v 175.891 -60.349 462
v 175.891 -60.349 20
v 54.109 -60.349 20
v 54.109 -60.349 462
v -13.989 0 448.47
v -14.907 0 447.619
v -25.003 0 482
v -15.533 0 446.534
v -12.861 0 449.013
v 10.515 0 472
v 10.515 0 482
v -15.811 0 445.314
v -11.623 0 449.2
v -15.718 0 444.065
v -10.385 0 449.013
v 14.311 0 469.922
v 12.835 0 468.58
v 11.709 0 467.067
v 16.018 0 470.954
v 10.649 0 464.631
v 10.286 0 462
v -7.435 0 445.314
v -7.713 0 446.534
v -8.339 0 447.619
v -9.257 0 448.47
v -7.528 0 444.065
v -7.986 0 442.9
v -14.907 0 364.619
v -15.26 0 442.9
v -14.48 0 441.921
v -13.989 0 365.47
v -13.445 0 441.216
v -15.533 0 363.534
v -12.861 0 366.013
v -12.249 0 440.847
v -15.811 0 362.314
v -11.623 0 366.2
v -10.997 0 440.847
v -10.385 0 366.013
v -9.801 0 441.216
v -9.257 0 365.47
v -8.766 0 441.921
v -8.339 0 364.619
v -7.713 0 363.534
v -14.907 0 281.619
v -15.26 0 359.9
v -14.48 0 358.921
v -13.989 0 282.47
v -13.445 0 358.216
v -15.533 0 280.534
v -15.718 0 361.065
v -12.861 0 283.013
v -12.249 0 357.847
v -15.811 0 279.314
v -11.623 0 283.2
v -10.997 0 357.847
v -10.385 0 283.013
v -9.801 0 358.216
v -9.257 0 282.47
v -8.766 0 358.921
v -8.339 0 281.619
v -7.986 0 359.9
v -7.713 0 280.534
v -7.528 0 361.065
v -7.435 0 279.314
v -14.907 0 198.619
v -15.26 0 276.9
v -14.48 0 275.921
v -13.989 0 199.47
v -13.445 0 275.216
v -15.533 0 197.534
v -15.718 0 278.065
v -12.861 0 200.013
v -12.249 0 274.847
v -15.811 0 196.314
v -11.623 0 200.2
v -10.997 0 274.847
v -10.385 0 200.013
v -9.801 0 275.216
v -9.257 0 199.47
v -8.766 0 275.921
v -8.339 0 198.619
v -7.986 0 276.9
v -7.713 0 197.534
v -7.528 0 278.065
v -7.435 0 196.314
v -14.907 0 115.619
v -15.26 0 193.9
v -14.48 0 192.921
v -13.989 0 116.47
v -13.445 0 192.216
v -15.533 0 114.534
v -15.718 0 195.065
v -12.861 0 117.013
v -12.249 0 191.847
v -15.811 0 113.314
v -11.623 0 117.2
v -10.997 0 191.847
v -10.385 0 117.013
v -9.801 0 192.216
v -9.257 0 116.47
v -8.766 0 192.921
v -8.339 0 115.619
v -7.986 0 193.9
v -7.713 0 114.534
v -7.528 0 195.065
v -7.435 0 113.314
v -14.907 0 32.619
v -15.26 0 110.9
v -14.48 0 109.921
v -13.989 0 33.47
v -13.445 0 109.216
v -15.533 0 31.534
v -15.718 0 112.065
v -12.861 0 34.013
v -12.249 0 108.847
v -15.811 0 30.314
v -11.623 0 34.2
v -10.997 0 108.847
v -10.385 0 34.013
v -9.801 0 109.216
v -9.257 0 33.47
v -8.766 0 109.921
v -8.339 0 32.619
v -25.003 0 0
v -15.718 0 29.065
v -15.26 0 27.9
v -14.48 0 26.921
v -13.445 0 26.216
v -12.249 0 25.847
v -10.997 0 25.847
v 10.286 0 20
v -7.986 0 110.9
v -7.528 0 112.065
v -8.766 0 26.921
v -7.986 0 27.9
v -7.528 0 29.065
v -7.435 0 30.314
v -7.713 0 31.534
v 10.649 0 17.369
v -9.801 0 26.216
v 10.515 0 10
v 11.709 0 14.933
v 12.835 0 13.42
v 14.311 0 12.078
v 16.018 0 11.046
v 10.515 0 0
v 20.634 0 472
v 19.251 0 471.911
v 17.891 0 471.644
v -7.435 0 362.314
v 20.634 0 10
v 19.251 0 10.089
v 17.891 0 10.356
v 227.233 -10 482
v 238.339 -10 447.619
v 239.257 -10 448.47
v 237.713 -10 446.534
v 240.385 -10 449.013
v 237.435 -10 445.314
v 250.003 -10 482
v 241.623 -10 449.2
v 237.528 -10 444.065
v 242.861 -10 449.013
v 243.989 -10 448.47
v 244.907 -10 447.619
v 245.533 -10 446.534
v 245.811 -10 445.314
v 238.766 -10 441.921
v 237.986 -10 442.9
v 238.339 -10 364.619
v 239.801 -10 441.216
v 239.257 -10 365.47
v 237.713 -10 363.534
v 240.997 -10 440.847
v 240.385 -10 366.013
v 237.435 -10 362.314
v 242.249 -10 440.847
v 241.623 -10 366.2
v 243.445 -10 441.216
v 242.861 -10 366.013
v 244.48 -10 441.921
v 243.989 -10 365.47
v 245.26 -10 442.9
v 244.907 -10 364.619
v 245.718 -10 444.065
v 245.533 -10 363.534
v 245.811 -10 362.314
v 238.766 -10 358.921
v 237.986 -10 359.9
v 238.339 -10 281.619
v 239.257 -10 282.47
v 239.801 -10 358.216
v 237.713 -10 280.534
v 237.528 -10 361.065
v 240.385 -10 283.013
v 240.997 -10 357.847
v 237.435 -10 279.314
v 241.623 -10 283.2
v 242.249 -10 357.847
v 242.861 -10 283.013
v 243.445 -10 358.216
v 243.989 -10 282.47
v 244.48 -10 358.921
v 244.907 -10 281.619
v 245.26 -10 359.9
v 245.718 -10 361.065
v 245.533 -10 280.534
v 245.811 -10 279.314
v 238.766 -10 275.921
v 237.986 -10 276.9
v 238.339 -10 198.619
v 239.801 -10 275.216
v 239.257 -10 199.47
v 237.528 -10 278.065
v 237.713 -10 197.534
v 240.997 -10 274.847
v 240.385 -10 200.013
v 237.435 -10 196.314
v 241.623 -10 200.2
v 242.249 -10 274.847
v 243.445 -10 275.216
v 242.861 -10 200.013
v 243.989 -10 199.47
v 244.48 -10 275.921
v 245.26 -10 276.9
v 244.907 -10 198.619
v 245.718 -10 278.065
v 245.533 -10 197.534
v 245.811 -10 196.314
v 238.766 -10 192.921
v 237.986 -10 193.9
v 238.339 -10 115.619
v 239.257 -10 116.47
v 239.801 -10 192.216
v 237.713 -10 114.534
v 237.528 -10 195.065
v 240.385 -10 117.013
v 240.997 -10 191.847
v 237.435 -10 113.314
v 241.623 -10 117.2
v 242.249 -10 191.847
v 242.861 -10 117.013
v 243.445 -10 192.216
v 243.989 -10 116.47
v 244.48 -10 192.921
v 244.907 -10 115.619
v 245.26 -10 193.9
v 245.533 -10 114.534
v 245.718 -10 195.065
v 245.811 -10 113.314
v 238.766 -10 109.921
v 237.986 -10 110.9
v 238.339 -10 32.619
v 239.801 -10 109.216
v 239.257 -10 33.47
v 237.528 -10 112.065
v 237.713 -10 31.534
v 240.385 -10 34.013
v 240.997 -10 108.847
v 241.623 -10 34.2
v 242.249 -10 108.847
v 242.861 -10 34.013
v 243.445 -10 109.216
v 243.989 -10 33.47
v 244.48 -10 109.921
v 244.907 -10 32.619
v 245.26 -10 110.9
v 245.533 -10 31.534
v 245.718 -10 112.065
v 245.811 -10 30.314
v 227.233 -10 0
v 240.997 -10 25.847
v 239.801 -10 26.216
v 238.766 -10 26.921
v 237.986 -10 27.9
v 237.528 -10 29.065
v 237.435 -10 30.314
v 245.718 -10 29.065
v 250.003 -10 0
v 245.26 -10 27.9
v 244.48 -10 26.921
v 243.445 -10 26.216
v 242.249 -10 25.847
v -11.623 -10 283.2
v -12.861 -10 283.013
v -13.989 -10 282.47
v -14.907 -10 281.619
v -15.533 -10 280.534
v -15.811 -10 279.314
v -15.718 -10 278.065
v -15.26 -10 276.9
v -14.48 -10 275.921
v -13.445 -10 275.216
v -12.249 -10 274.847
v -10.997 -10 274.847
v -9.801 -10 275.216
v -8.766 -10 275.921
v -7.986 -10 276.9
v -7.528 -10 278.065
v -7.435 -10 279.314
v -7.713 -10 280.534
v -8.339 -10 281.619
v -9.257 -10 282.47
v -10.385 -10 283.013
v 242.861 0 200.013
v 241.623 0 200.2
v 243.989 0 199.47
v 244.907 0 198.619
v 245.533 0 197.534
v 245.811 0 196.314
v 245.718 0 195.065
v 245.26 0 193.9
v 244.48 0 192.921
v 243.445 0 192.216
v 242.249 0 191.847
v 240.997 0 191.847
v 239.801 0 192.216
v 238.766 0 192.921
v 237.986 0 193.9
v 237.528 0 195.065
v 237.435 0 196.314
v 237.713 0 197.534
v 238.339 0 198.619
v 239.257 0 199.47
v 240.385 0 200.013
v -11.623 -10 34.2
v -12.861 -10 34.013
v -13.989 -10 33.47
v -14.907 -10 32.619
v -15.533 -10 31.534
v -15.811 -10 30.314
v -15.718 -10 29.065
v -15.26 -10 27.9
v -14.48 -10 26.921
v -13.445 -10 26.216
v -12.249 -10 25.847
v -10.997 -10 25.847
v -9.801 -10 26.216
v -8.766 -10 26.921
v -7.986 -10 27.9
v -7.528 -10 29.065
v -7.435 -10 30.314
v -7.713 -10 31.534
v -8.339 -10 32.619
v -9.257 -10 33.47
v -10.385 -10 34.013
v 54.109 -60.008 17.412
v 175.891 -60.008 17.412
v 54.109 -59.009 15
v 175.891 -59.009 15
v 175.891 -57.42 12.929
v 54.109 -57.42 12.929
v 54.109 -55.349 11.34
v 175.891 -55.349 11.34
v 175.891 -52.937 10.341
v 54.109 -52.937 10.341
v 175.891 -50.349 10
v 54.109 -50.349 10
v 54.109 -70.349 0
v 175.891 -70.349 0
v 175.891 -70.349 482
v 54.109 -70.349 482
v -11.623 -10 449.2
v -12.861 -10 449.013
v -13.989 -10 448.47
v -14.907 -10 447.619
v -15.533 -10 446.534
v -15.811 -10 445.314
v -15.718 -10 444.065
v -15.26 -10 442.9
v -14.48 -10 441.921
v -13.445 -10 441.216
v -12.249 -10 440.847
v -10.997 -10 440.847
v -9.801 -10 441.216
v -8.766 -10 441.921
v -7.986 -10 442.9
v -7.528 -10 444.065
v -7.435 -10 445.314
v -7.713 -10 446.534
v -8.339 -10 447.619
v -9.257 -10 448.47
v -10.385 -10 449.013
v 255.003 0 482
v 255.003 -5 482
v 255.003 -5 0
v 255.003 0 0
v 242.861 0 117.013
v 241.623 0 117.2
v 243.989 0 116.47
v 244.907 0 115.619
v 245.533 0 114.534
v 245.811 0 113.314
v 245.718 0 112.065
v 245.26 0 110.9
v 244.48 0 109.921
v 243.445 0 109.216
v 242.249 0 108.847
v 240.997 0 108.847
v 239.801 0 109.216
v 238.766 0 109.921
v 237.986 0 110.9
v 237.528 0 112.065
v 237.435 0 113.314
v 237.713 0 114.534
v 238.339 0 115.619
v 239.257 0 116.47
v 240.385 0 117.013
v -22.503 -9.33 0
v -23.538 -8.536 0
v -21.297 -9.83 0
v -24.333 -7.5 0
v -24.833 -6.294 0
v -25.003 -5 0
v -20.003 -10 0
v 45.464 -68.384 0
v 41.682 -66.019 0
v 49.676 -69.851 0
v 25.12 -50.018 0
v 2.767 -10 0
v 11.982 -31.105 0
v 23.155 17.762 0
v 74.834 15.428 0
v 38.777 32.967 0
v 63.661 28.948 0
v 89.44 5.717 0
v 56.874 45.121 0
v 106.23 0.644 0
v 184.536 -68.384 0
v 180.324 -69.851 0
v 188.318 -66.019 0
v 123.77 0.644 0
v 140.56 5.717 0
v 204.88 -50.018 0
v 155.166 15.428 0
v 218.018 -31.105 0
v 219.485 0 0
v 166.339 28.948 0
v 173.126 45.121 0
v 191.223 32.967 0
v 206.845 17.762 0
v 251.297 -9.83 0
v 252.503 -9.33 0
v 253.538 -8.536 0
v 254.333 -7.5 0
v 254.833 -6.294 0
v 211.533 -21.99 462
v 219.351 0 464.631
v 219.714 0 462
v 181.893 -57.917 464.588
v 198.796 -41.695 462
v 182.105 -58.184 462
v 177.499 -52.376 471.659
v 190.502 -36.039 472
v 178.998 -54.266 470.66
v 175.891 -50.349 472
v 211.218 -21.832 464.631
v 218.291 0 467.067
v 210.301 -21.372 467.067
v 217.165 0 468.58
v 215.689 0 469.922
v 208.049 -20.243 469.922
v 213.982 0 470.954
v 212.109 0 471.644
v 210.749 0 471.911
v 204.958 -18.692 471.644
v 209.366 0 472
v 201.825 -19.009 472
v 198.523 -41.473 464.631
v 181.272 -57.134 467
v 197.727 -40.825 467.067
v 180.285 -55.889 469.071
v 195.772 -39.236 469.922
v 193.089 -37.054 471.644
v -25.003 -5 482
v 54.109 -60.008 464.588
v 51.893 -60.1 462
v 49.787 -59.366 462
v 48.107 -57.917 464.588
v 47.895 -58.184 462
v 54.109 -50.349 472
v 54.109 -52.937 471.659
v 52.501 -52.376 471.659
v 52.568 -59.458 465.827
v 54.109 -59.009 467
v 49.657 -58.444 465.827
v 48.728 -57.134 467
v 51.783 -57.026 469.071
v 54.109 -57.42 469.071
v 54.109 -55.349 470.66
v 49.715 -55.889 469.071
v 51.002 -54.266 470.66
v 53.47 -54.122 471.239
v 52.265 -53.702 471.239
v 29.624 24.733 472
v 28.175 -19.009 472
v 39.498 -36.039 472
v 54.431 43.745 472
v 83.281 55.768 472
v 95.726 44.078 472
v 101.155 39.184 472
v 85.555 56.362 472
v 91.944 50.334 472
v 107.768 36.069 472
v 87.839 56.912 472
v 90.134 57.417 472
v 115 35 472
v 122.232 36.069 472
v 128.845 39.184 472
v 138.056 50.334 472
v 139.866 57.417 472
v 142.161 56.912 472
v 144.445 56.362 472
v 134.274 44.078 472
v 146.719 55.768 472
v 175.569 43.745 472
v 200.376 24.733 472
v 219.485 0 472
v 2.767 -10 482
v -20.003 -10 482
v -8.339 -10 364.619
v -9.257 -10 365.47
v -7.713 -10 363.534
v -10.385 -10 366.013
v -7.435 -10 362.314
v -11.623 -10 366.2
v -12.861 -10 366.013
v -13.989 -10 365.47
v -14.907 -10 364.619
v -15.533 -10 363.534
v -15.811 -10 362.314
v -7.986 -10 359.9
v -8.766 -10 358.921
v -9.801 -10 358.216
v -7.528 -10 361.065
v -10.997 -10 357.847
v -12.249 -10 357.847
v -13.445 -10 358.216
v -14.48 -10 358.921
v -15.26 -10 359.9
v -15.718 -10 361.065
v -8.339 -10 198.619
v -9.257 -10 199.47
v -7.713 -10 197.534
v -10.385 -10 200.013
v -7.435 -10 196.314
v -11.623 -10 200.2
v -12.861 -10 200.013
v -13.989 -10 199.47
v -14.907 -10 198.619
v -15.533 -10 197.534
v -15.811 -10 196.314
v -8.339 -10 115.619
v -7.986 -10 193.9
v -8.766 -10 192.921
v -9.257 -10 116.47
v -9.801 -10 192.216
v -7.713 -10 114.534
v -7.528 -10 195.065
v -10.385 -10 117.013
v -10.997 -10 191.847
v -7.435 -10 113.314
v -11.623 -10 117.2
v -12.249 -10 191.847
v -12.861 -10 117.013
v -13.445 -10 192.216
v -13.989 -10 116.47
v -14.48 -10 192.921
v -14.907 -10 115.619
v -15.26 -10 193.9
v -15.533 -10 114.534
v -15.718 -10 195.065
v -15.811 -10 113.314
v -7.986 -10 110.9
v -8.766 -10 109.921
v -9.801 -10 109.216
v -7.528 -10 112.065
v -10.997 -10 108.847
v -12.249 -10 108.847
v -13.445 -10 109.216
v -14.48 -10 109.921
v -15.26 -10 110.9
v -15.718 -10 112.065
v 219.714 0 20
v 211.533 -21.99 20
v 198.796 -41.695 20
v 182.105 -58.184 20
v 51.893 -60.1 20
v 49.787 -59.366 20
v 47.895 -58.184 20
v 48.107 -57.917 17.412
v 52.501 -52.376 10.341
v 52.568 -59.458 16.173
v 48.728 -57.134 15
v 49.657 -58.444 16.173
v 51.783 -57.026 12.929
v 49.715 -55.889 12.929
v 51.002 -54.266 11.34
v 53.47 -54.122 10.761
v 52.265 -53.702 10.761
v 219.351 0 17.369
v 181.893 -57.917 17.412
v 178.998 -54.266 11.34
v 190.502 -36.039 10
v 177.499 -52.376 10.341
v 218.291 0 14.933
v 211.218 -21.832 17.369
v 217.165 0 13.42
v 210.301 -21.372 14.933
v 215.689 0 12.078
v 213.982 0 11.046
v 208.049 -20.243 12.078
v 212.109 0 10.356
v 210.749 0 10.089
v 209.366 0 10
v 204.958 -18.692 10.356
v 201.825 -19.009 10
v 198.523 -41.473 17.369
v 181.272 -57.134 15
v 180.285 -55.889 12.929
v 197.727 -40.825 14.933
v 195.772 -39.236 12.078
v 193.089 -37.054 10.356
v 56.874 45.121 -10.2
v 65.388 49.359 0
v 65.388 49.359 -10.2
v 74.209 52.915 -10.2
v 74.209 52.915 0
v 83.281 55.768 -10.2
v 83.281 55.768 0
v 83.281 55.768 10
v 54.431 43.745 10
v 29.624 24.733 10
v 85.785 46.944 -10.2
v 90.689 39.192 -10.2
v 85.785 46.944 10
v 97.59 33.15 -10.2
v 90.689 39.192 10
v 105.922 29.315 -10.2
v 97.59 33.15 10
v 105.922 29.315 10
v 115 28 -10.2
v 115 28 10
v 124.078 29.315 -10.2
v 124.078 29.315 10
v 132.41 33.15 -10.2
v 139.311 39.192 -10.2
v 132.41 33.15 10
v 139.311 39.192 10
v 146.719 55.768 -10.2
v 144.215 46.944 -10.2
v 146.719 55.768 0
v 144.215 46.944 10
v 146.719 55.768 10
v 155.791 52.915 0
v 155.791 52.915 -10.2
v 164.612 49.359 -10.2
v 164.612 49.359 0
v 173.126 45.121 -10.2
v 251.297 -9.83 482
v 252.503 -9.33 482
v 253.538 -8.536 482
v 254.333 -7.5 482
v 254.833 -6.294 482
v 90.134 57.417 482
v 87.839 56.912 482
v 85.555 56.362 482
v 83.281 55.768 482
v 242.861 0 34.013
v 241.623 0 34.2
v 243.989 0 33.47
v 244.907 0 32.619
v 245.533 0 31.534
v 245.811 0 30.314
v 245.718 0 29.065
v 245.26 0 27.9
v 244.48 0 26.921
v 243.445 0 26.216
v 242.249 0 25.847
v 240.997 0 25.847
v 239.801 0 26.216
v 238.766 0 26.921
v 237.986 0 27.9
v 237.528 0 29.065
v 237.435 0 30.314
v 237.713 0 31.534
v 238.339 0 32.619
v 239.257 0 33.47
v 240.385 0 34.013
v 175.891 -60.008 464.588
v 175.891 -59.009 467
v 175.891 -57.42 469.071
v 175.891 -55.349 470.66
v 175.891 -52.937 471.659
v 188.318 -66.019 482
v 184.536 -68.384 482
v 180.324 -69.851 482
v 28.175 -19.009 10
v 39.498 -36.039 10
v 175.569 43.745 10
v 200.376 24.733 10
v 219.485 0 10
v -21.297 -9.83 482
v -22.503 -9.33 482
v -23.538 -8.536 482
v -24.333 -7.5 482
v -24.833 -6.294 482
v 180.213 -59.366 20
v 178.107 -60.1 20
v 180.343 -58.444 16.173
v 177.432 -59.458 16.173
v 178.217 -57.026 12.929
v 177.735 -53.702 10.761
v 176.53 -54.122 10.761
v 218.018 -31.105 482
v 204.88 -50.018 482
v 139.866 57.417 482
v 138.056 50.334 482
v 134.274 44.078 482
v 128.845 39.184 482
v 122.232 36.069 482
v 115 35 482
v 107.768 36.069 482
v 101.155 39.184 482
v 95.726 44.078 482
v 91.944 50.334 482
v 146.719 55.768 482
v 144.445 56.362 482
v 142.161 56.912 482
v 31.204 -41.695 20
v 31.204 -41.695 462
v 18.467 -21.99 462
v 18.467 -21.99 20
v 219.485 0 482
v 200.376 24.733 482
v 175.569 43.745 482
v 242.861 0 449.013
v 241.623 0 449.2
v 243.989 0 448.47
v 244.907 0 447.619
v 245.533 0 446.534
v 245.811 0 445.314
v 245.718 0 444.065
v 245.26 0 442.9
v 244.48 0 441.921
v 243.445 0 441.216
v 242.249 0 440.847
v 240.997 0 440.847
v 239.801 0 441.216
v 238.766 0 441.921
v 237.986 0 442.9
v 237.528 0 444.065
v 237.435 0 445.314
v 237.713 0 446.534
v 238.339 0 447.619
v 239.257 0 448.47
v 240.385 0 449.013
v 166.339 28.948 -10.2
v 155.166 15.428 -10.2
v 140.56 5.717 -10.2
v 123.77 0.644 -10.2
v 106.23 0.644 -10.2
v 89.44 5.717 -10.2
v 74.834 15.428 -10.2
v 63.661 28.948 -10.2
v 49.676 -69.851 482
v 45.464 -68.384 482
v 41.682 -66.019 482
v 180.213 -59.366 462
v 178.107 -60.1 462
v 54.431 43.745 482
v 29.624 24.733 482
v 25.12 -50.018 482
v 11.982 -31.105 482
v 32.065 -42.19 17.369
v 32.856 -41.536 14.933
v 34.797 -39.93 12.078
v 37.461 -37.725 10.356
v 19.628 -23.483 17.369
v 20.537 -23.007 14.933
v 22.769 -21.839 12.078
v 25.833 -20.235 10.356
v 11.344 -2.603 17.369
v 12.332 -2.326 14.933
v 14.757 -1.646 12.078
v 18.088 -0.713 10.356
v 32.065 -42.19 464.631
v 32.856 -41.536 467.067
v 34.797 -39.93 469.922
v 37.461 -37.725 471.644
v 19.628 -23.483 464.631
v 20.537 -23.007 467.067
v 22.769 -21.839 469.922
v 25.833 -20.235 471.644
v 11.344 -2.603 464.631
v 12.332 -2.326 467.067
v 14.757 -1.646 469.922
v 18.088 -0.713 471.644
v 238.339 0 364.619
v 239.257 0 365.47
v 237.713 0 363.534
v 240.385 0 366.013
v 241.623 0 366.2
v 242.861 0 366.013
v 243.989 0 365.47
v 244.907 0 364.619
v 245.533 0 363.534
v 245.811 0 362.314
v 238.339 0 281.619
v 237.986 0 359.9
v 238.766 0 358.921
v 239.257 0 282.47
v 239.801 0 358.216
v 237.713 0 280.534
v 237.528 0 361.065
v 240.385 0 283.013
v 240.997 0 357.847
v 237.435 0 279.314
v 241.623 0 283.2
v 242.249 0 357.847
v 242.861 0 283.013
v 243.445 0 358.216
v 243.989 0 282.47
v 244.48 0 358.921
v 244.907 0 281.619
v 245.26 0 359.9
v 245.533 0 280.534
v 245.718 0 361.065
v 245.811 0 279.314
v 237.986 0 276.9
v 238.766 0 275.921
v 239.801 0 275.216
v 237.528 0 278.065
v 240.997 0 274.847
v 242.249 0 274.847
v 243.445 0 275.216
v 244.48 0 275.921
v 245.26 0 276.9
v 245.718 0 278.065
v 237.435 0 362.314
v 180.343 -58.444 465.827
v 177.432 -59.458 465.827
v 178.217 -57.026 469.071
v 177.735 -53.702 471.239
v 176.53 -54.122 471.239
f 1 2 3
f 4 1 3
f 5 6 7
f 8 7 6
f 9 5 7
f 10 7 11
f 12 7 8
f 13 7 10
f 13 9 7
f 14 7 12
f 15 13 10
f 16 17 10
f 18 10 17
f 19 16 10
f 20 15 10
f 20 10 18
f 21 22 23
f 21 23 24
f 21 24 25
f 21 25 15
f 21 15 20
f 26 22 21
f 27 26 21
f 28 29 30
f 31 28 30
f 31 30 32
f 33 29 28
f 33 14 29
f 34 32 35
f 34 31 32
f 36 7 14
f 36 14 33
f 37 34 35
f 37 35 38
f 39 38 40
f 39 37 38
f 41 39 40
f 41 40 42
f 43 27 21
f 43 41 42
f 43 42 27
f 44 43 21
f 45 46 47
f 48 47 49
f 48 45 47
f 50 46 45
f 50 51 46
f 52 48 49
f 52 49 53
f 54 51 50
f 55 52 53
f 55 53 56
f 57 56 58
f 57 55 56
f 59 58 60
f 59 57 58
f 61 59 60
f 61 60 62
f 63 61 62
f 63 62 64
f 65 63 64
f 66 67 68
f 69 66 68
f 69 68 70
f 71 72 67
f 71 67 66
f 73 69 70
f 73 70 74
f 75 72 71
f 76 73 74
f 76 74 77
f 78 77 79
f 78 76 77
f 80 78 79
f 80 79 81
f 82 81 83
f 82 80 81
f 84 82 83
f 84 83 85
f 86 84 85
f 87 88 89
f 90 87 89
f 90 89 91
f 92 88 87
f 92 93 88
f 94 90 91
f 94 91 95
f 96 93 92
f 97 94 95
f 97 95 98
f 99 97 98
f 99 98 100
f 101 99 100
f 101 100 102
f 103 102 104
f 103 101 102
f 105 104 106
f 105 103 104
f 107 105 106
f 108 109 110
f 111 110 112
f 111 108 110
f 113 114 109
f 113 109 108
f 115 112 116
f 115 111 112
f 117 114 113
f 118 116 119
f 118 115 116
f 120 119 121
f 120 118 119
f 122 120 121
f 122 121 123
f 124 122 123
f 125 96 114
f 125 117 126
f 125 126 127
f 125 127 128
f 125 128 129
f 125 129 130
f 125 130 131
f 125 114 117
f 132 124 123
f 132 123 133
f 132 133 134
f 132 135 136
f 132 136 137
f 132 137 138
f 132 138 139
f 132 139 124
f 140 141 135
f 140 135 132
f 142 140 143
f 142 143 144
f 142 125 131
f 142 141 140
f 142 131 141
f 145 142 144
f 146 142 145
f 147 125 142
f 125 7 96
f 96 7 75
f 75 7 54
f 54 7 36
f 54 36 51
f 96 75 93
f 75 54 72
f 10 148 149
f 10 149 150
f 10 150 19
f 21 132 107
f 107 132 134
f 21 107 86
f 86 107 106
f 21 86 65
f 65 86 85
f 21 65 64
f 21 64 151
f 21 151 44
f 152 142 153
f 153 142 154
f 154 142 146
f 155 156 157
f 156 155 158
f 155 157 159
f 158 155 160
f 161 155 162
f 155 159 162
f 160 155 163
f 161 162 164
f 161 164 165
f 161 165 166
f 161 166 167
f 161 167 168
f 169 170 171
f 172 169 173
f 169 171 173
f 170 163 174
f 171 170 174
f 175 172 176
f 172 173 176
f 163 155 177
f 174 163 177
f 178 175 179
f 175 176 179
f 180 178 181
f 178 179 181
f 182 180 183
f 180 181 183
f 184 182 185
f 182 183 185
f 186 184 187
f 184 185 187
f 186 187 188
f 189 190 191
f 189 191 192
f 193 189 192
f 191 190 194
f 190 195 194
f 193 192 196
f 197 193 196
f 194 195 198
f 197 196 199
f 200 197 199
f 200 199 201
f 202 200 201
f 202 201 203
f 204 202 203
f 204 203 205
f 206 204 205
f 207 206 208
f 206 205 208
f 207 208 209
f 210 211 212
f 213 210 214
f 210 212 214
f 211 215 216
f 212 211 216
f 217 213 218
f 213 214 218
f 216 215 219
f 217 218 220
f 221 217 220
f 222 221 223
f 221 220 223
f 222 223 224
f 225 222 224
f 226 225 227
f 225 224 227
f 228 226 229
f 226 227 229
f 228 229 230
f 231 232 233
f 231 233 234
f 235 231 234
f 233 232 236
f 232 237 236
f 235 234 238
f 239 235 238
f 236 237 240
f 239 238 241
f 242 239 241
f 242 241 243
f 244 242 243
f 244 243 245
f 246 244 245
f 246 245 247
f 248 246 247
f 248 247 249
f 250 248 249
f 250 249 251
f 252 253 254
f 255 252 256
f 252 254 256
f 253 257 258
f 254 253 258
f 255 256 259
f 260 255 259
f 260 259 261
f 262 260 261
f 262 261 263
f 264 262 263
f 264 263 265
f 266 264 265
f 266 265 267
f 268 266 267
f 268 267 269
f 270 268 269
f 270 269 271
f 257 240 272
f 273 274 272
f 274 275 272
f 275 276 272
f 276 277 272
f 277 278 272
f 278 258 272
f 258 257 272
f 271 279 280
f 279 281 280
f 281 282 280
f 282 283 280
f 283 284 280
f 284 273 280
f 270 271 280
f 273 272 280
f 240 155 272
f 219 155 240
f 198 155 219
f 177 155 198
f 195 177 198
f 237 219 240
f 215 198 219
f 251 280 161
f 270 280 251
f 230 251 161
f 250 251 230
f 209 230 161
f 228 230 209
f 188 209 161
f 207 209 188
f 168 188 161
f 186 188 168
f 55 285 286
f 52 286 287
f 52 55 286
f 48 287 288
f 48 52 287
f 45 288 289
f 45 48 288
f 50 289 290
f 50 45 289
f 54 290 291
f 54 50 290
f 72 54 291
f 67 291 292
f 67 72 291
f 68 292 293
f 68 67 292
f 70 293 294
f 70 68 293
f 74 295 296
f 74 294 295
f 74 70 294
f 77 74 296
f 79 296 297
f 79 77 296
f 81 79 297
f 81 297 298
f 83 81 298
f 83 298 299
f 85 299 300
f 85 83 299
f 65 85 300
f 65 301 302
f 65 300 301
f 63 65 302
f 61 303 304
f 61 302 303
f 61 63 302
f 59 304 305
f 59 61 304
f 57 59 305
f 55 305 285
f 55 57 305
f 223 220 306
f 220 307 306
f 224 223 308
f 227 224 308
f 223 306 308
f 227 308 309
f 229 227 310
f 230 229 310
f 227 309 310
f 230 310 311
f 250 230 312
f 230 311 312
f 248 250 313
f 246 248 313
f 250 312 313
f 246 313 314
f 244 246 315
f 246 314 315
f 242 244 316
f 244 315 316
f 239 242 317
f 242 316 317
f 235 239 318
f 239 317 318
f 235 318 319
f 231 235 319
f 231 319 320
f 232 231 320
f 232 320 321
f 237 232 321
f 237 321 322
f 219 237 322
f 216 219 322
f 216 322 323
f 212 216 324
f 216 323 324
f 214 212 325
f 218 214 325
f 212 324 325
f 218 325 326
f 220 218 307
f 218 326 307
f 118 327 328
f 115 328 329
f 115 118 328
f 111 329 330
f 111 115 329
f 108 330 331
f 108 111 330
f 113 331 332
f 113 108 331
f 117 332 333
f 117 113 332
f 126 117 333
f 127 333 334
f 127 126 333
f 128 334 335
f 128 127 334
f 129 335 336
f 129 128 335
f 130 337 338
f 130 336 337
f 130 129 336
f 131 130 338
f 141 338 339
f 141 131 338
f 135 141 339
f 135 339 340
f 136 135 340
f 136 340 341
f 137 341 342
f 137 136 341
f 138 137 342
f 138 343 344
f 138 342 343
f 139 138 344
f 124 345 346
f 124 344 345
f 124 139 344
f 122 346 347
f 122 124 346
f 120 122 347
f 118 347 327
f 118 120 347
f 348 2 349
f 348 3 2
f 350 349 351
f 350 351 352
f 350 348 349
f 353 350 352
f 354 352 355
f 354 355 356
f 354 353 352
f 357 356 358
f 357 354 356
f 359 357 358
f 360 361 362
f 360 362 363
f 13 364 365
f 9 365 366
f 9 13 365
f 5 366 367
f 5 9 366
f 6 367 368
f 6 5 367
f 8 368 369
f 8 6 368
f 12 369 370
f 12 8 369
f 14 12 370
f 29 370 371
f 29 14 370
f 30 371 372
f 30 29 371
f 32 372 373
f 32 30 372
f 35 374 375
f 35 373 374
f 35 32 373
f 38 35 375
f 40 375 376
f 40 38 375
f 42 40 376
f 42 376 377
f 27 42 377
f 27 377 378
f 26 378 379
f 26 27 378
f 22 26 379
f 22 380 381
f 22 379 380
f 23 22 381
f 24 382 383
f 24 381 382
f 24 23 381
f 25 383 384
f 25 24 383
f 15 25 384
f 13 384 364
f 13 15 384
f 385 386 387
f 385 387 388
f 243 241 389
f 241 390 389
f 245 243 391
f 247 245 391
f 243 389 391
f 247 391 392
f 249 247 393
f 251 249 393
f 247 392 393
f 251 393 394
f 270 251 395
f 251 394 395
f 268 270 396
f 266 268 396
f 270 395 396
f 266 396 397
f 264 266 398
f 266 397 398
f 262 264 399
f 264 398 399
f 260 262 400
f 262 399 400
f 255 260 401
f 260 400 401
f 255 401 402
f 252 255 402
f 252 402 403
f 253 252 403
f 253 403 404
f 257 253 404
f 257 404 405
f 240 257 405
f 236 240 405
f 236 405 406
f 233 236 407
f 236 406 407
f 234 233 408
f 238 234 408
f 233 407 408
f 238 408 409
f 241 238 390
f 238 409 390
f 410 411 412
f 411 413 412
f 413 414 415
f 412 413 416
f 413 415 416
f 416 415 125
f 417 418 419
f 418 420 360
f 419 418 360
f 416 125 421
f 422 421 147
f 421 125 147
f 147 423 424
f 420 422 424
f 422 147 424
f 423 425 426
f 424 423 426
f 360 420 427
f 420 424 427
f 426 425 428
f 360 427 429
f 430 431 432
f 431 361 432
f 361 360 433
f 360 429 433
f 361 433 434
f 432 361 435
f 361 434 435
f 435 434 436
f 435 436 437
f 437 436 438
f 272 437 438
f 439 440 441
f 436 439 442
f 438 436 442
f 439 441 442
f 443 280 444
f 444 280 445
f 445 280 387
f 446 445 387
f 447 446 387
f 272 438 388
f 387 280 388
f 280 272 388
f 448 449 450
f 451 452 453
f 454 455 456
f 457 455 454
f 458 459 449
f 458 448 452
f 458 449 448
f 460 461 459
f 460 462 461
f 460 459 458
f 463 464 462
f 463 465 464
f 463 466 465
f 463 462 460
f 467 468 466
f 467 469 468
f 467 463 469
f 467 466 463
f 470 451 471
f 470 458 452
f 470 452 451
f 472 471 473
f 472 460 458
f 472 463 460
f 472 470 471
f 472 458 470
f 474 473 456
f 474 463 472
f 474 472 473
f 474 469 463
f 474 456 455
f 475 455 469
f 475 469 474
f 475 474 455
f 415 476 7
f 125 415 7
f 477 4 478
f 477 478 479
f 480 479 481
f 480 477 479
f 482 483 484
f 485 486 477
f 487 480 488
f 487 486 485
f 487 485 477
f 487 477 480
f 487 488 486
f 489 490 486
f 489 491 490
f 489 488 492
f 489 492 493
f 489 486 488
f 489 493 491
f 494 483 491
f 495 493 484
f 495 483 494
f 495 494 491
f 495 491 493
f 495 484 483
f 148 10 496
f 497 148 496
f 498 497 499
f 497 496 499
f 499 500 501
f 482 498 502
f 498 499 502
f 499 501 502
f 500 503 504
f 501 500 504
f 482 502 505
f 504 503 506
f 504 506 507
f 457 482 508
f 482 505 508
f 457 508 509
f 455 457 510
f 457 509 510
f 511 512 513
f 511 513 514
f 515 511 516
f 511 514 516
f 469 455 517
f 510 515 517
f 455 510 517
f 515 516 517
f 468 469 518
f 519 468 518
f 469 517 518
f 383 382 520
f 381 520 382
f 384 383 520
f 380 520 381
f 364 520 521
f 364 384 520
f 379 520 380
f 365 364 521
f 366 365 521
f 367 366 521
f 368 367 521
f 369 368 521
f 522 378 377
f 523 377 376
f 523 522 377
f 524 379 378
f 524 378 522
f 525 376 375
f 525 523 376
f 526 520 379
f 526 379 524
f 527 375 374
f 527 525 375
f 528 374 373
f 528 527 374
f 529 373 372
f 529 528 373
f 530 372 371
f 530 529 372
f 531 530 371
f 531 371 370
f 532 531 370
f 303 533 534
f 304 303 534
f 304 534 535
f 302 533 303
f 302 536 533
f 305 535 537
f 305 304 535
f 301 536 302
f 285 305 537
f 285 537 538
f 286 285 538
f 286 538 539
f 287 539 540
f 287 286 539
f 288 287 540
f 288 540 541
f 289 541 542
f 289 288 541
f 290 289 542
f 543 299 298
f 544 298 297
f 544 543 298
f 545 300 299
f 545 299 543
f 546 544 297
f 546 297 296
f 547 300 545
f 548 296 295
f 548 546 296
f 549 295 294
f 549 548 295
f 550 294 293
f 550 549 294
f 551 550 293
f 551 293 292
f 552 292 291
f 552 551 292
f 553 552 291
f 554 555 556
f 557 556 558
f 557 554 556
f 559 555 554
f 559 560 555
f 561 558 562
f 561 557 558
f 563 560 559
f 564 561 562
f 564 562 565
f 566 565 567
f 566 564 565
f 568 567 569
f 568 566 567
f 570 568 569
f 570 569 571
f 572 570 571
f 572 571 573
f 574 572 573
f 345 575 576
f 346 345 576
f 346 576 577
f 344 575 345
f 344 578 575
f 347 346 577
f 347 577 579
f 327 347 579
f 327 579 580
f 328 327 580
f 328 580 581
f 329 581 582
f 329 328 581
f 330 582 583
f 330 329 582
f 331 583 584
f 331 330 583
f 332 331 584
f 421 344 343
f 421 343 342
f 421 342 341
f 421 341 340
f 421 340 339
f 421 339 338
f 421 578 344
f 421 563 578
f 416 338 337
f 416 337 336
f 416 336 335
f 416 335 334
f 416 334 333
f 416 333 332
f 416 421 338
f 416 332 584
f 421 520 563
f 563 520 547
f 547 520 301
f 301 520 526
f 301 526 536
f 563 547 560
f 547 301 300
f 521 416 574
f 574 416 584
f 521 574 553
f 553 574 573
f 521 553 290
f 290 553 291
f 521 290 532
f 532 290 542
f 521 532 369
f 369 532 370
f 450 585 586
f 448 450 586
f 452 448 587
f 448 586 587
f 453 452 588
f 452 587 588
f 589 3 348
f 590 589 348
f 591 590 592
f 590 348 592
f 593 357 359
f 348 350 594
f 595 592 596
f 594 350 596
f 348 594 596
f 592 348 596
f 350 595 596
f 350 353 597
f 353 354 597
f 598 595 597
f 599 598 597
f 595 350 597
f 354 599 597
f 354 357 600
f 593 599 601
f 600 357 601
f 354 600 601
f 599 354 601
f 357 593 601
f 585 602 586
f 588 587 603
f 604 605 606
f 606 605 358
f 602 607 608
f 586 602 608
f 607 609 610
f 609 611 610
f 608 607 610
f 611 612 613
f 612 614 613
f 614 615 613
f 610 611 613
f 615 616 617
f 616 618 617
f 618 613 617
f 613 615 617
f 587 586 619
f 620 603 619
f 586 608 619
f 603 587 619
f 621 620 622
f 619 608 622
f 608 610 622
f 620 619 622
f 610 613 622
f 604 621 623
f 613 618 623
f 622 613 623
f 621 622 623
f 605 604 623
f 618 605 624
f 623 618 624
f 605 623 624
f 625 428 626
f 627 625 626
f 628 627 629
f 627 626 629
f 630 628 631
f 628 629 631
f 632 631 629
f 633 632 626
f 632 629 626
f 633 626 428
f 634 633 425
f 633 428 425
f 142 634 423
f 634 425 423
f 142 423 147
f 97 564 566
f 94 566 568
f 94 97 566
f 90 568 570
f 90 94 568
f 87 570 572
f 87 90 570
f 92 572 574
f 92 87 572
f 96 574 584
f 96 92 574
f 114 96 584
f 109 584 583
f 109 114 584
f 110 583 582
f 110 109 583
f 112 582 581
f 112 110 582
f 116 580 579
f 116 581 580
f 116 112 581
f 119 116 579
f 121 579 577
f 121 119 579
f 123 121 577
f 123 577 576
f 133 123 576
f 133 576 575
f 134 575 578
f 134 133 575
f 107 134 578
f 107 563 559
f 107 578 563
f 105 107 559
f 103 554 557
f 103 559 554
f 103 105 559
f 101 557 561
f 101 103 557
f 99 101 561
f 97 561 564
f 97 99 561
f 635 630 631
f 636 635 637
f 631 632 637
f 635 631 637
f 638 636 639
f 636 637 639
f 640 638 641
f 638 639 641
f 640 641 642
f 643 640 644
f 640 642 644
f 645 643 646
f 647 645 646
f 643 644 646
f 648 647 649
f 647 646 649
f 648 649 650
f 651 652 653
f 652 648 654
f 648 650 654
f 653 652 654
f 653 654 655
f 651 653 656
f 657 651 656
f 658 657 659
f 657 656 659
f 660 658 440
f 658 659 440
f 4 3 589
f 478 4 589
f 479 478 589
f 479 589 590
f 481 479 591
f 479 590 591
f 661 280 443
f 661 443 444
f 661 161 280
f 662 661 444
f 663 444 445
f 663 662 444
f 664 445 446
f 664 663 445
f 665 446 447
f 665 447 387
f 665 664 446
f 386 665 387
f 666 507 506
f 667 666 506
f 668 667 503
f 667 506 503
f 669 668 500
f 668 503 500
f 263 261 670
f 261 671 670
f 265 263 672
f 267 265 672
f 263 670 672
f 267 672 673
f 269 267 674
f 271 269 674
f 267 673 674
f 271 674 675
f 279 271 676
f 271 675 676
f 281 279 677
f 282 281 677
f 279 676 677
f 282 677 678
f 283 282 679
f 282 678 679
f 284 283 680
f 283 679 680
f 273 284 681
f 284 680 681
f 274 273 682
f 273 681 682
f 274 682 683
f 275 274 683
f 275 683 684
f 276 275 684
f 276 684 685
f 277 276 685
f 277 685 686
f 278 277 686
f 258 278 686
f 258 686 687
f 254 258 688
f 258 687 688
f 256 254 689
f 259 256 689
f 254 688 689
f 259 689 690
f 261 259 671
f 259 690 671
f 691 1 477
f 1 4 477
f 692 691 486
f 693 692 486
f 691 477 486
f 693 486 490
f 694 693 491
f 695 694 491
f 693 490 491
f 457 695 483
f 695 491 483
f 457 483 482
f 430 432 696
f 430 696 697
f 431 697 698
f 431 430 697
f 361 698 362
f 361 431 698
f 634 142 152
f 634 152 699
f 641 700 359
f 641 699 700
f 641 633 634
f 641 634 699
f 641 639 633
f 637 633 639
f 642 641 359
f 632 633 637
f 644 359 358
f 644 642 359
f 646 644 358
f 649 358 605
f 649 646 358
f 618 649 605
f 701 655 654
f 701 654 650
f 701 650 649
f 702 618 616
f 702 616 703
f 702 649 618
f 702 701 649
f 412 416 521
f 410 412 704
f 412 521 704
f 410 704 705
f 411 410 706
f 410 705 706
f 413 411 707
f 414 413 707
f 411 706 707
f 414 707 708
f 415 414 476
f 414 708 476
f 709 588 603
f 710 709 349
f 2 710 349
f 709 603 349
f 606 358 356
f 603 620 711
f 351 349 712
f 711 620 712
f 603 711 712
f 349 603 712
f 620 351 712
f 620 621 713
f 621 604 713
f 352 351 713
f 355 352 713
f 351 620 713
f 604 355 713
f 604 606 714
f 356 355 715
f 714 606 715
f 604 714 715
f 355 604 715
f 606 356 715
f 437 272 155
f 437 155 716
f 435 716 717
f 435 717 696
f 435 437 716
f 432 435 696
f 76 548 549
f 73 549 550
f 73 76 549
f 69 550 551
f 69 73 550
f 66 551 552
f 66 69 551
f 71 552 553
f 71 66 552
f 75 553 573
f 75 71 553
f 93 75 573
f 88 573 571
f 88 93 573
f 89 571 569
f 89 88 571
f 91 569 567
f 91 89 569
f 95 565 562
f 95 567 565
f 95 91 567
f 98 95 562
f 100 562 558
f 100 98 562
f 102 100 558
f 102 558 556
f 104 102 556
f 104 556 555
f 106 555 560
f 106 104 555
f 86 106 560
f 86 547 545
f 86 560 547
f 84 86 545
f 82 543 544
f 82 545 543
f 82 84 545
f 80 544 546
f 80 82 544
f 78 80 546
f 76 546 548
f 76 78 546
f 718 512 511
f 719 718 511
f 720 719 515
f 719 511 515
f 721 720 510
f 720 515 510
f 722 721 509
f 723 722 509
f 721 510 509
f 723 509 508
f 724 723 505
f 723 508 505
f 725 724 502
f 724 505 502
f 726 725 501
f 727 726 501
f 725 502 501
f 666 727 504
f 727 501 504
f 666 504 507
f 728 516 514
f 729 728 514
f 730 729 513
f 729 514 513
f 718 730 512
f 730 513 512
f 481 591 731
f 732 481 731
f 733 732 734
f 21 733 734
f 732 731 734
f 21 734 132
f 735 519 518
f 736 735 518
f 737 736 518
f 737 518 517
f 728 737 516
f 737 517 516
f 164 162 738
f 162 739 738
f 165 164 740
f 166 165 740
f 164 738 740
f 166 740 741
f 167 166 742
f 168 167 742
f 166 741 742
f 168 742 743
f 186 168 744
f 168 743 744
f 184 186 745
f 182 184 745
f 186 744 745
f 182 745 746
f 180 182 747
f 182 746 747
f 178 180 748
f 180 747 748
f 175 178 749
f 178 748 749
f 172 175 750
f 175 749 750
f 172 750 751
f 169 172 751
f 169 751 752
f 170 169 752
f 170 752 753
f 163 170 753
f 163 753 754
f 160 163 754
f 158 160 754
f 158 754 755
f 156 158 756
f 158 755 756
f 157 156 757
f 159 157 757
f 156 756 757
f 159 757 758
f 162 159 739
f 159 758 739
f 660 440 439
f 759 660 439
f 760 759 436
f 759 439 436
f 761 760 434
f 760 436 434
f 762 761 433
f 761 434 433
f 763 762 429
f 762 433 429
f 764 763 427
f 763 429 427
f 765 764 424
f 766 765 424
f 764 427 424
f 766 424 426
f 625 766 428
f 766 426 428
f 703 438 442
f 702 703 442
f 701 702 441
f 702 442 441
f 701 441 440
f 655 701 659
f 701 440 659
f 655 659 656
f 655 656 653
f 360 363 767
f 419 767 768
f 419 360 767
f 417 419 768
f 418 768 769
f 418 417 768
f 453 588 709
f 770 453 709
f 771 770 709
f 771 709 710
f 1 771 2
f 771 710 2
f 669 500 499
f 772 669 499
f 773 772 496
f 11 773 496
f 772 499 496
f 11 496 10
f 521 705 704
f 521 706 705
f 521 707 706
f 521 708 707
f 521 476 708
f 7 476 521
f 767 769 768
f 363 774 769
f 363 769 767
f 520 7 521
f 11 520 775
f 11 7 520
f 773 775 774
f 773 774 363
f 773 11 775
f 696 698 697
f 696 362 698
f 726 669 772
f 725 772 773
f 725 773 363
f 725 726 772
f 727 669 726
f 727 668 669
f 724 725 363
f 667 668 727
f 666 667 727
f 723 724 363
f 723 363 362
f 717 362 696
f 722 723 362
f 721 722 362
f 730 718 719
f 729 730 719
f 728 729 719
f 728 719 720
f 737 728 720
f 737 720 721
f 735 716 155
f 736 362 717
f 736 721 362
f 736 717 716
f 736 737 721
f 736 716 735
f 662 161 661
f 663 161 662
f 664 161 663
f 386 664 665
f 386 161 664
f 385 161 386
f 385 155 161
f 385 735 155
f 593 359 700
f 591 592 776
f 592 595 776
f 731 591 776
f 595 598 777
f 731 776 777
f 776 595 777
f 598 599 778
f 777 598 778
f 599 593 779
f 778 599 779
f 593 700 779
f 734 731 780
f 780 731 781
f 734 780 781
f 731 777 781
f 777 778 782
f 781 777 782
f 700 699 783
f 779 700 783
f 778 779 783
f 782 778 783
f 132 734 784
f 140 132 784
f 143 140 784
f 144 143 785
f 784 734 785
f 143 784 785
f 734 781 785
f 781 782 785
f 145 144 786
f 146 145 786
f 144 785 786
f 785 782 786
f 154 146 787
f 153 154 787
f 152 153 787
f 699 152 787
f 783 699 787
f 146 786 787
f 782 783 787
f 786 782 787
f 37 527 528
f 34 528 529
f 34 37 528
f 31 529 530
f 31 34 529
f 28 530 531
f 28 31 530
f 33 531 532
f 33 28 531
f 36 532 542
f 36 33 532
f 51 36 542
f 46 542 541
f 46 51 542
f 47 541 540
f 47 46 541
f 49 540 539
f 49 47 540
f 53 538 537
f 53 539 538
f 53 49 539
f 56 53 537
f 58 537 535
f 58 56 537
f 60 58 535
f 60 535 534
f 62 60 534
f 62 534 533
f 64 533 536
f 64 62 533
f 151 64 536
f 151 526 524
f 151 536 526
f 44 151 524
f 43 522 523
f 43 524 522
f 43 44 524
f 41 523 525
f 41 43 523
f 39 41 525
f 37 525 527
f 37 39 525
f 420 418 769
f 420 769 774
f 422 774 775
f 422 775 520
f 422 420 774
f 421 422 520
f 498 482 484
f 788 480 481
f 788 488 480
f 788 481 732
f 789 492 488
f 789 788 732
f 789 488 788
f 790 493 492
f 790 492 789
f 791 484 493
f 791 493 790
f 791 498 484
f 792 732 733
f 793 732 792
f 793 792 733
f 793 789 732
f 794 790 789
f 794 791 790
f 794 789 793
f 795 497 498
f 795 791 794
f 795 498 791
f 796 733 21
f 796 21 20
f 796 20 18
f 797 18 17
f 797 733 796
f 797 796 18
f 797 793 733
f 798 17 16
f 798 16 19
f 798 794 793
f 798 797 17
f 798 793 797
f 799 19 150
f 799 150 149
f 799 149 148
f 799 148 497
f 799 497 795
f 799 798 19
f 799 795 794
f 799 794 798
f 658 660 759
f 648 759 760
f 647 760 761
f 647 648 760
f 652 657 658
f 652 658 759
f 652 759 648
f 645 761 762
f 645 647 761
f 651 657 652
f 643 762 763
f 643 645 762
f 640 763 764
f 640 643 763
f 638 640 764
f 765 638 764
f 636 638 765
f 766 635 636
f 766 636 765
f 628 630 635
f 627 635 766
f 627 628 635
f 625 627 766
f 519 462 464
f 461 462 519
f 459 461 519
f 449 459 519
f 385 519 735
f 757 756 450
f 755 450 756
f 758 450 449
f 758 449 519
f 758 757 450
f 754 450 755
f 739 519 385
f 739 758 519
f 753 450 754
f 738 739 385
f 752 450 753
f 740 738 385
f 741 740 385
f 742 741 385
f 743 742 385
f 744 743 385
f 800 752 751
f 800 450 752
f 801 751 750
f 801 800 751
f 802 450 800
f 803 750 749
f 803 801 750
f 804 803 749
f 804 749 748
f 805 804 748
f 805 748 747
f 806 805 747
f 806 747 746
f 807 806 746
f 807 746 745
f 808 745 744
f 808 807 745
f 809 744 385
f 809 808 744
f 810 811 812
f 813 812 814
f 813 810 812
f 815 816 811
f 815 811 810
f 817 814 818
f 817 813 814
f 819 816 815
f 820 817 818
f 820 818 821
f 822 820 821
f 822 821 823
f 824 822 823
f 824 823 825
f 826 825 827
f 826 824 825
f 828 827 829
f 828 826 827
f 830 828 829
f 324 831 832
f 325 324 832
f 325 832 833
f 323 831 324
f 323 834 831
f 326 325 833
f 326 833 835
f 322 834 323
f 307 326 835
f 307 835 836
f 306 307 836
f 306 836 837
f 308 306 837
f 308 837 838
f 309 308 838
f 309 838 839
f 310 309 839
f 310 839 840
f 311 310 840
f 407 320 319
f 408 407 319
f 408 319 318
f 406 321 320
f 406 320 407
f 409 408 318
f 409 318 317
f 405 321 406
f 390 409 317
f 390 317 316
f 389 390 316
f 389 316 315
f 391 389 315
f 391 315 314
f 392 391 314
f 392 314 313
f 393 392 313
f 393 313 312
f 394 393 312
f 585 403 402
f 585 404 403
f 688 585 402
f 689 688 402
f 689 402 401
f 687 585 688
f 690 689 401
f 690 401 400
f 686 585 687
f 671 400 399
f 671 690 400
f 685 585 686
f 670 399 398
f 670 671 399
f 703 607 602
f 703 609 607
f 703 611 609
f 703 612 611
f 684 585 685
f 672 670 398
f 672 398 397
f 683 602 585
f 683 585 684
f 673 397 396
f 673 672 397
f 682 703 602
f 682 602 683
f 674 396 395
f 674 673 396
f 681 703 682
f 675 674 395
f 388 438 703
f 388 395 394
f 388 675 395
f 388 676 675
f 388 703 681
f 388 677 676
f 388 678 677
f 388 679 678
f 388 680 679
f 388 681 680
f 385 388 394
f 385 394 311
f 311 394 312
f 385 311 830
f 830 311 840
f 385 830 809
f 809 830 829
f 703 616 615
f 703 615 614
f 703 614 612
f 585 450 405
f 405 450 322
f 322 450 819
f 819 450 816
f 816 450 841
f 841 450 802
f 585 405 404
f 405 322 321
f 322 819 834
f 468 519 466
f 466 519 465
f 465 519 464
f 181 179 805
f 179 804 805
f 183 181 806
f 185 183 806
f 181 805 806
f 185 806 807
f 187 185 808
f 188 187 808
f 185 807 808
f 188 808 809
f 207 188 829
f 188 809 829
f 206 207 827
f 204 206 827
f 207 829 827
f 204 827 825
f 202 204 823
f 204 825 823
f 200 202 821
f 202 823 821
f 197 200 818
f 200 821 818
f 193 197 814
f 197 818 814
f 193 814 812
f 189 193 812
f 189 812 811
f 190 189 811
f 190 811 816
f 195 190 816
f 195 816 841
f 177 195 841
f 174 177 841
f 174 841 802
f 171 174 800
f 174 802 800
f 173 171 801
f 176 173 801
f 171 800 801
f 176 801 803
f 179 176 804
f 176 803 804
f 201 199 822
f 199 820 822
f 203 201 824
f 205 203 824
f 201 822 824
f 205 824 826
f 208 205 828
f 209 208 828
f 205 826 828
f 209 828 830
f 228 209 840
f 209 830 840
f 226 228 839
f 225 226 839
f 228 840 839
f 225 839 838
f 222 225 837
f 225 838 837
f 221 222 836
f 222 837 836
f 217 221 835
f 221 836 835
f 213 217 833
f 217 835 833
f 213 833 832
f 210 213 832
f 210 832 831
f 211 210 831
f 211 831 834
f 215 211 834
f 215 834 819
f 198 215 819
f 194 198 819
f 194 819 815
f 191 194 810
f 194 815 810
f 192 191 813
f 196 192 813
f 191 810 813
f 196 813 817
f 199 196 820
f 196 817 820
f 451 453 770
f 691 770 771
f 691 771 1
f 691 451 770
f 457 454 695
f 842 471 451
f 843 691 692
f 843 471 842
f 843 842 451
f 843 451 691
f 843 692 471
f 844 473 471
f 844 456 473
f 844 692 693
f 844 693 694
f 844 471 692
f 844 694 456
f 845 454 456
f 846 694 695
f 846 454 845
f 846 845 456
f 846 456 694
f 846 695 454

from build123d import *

# Parameters (mm, degrees)
SALIENTE_EXTRUIR1_DEPTH              = 482
VACIADO1_T                           = -10
REDONDEO1_R                          = 10
REDONDEO2_R                          = 10
SALIENTE_EXTRUIR2_START              = -482
SALIENTE_EXTRUIR2_DEPTH              = 482
REDONDEO3_R                          = 5
SALIENTE_EXTRUIR3_DEPTH              = 10
SALIENTE_EXTRUIR4_DEPTH              = 10.2
SALIENTE_EXTRUIR5_START              = -10
SALIENTE_EXTRUIR5_DEPTH              = 10
RANURA_DE_MARGEN_PARA_M81_AT_2_COUNT = 2
RANURA_DE_MARGEN_PARA_M81_AT_2_PITCH = 83
RANURA_DE_MARGEN_PARA_M81_AT_3_COUNT = 2
RANURA_DE_MARGEN_PARA_M81_AT_3_PITCH = 166
RANURA_DE_MARGEN_PARA_M81_AT_4_COUNT = 2
RANURA_DE_MARGEN_PARA_M81_AT_4_PITCH = 249
RANURA_DE_MARGEN_PARA_M81_AT_5_COUNT = 2
RANURA_DE_MARGEN_PARA_M81_AT_5_PITCH = 332
RANURA_DE_MARGEN_PARA_M81_AT_6_COUNT = 2
RANURA_DE_MARGEN_PARA_M81_AT_6_PITCH = 415


with BuildPart() as part:
    # Croquis1 → Saliente-Extruir1 (new body)
    with BuildSketch(Plane.XY):
        with BuildLine():
            Line((0, 0), (230, 0))
            ThreePointArc((230, 0), (214.777511796, -36.557011873), (188.317948474, -66.019373845))
            ThreePointArc((188.317948474, -66.019373845), (182.470809449, -69.235256105), (175.891177547, -70.348529442))
            Line((175.891177547, -70.348529442), (54.108822453, -70.348529442))
            ThreePointArc((54.108822453, -70.348529442), (47.529190551, -69.235256105), (41.682051526, -66.019373845))
            ThreePointArc((41.682051526, -66.019373845), (15.222488204, -36.557011873), (0, 0))
        make_face()
    extrude(amount=SALIENTE_EXTRUIR1_DEPTH)

    # Vaciado1
    vaciado1_openings = [part.faces().sort_by_distance(p)[0] for p in [
        (115, 0, 241),
    ]]
    offset(amount=VACIADO1_T, openings=vaciado1_openings, kind=Kind.INTERSECTION)

    # Redondeo1
    redondeo1_edges = [part.edges().sort_by_distance(p)[0] for p in [
        (24.298628648, -32.189552634, 472),
        (50.819006502, -59.791892774, 472),
        (115, -60.348529442, 472),
        (179.180993498, -59.791892774, 472),
        (205.701371352, -32.189552634, 472),
    ]]
    fillet(redondeo1_edges, radius=REDONDEO1_R)

    # Redondeo2
    redondeo2_edges = [part.edges().sort_by_distance(p)[0] for p in [
        (24.298628648, -32.189552634, 10),
        (50.819006502, -59.791892774, 10),
        (115, -60.348529442, 10),
        (179.180993498, -59.791892774, 10),
        (205.701371352, -32.189552634, 10),
    ]]
    fillet(redondeo2_edges, radius=REDONDEO2_R)

    # Croquis2 → Saliente-Extruir2 (add)
    with BuildSketch(Plane.XY.offset(482).offset(SALIENTE_EXTRUIR2_START)):
        with BuildLine():
            Line((2.767082202, -10), (-25.0029178, -10))
            Line((-25.0029178, -10), (-25.0029178, 0))
            Line((-25.0029178, 0), (0, 0))
            ThreePointArc((0, 0), (1.273575047, -5.030428511), (2.767082202, -10))
        make_face()
        with BuildLine():
            Line((255.0029178, 0), (230, 0))
            ThreePointArc((230, 0), (228.726424953, -5.030428511), (227.232917798, -10))
            Line((227.232917798, -10), (255.0029178, -10))
            Line((255.0029178, -10), (255.0029178, 0))
        make_face()
    extrude(amount=SALIENTE_EXTRUIR2_DEPTH)

    # Redondeo3
    redondeo3_edges = [part.edges().sort_by_distance(p)[0] for p in [
        (-25.0029178, -10, 241),
        (255.0029178, -10, 241),
    ]]
    fillet(redondeo3_edges, radius=REDONDEO3_R)



with BuildPart() as body_2:
    # Croquis3 → Saliente-Extruir3 (new body)
    with BuildSketch(Plane(origin=(0, 0, 0), x_dir=(-1, 0, 0), z_dir=(0, 0, -1))):
        with BuildLine():
            Line((-10.515, 0), (-219.485, 0))
            ThreePointArc((-219.485, 0), (-188.589303813, 35.043815425), (-146.718891775, 55.767754196))
            ThreePointArc((-146.718891775, 55.767754196), (-115, 28), (-83.281108225, 55.767754196))
            ThreePointArc((-83.281108225, 55.767754196), (-41.410696187, 35.043815425), (-10.515, 0))
        make_face()
    extrude(amount=-SALIENTE_EXTRUIR3_DEPTH)


with BuildPart() as part_1:
    add(part.part)

    add(body_2.part)  # Saliente-Extruir4 merges body 2
    # Croquis4 → Saliente-Extruir4 (add)
    with BuildSketch(Plane(origin=(0, 0, 0), x_dir=(-1, 0, 0), z_dir=(0, 0, -1))):
        with BuildLine():
            ThreePointArc((-173.125860697, 45.121010845), (-115, 0), (-56.874139303, 45.121010845))
            ThreePointArc((-56.874139303, 45.121010845), (-69.763309442, 51.223971947), (-83.281108225, 55.767754196))
            ThreePointArc((-83.281108225, 55.767754196), (-115, 28), (-146.718891775, 55.767754196))
            ThreePointArc((-146.718891775, 55.767754196), (-160.236690558, 51.223971947), (-173.125860697, 45.121010845))
        make_face()
    extrude(amount=SALIENTE_EXTRUIR4_DEPTH)

    # Croquis5 → Saliente-Extruir5 (add)
    with BuildSketch(Plane.XY.offset(482).offset(SALIENTE_EXTRUIR5_START)):
        with BuildLine():
            ThreePointArc((83.281108225, 55.767754196), (41.410696187, 35.043815425), (10.515, 0))
            Line((10.515, 0), (219.485, 0))
            ThreePointArc((219.485, 0), (188.589303813, 35.043815425), (146.718891775, 55.767754196))
            ThreePointArc((146.718891775, 55.767754196), (115, 28), (83.281108225, 55.767754196))
        make_face()
        with BuildLine():
            ThreePointArc((90.133812203, 57.416842161), (86.69544771, 56.642215547), (83.281108225, 55.767754196))
            ThreePointArc((83.281108225, 55.767754196), (115, 28), (146.718891775, 55.767754196))
            ThreePointArc((146.718891775, 55.767754196), (143.30455229, 56.642215547), (139.866187797, 57.416842161))
            ThreePointArc((139.866187797, 57.416842161), (115, 35), (90.133812203, 57.416842161))
        make_face()
    extrude(amount=SALIENTE_EXTRUIR5_DEPTH)

    # Croquis8 → Ranura de margen para M81 (revolve, cut)
    with BuildSketch(Plane(origin=(-11.6229178, 0, 30), x_dir=(0, 0, 1), z_dir=(1, 0, 0))):
        Polygon((0, 0), (0, 92.5236146), (4.2, 90), (4.2, 0), align=None)
    ranura_de_margen_para_m81 = revolve(axis=Axis((-11.6229178, 6.35, 30), (0, -1, 0)), mode=Mode.SUBTRACT)

    # Ranura de margen para M81 at 2: Ranura de margen para M81 ×2
    with Locations(*[(0, 0, i * RANURA_DE_MARGEN_PARA_M81_AT_2_PITCH) for i in range(1, RANURA_DE_MARGEN_PARA_M81_AT_2_COUNT)]):
        add(ranura_de_margen_para_m81, mode=Mode.SUBTRACT)

    # Ranura de margen para M81 at 3: Ranura de margen para M81 ×2
    with Locations(*[(0, 0, i * RANURA_DE_MARGEN_PARA_M81_AT_3_PITCH) for i in range(1, RANURA_DE_MARGEN_PARA_M81_AT_3_COUNT)]):
        add(ranura_de_margen_para_m81, mode=Mode.SUBTRACT)

    # Ranura de margen para M81 at 4: Ranura de margen para M81 ×2
    with Locations(*[(0, 0, i * RANURA_DE_MARGEN_PARA_M81_AT_4_PITCH) for i in range(1, RANURA_DE_MARGEN_PARA_M81_AT_4_COUNT)]):
        add(ranura_de_margen_para_m81, mode=Mode.SUBTRACT)

    # Ranura de margen para M81 at 5: Ranura de margen para M81 ×2
    with Locations(*[(0, 0, i * RANURA_DE_MARGEN_PARA_M81_AT_5_PITCH) for i in range(1, RANURA_DE_MARGEN_PARA_M81_AT_5_COUNT)]):
        add(ranura_de_margen_para_m81, mode=Mode.SUBTRACT)

    # Ranura de margen para M81 at 6: Ranura de margen para M81 ×2
    with Locations(*[(0, 0, i * RANURA_DE_MARGEN_PARA_M81_AT_6_PITCH) for i in range(1, RANURA_DE_MARGEN_PARA_M81_AT_6_COUNT)]):
        add(ranura_de_margen_para_m81, mode=Mode.SUBTRACT)

    # Simetría1: Ranura de margen para M81 across plane
    add(ranura_de_margen_para_m81.mirror(Plane(origin=(115, 0, 0), x_dir=(0, 0, 1), z_dir=(1, 0, 0))), mode=Mode.SUBTRACT)

    # Simetría1 copy 1 sketch → Simetría1 copy 1 (revolve, cut)
    with BuildSketch(Plane(origin=(241.6229178, 0, 113), x_dir=(0, 0, 1), z_dir=(-1, 0, 0))):
        Polygon((0, 0), (0, -92.5236146), (4.2, -90), (4.2, 0), align=None)
    revolve(axis=Axis((241.6229178, 6.35, 113), (0, 1, 0)), mode=Mode.SUBTRACT)

    # Simetría1 copy 2 sketch → Simetría1 copy 2 (revolve, cut)
    with BuildSketch(Plane(origin=(241.6229178, 0, 196), x_dir=(0, 0, 1), z_dir=(-1, 0, 0))):
        Polygon((0, 0), (0, -92.5236146), (4.2, -90), (4.2, 0), align=None)
    revolve(axis=Axis((241.6229178, 6.35, 196), (0, 1, 0)), mode=Mode.SUBTRACT)

    # Simetría1 copy 3 sketch → Simetría1 copy 3 (revolve, cut)
    with BuildSketch(Plane(origin=(241.6229178, 0, 279), x_dir=(0, 0, 1), z_dir=(-1, 0, 0))):
        Polygon((0, 0), (0, -92.5236146), (4.2, -90), (4.2, 0), align=None)
    revolve(axis=Axis((241.6229178, 6.35, 279), (0, 1, 0)), mode=Mode.SUBTRACT)

    # Simetría1 copy 4 sketch → Simetría1 copy 4 (revolve, cut)
    with BuildSketch(Plane(origin=(241.6229178, 0, 362), x_dir=(0, 0, 1), z_dir=(-1, 0, 0))):
        Polygon((0, 0), (0, -92.5236146), (4.2, -90), (4.2, 0), align=None)
    revolve(axis=Axis((241.6229178, 6.35, 362), (0, 1, 0)), mode=Mode.SUBTRACT)

    # Simetría1 copy 5 sketch → Simetría1 copy 5 (revolve, cut)
    with BuildSketch(Plane(origin=(241.6229178, 0, 445), x_dir=(0, 0, 1), z_dir=(-1, 0, 0))):
        Polygon((0, 0), (0, -92.5236146), (4.2, -90), (4.2, 0), align=None)
    revolve(axis=Axis((241.6229178, 6.35, 445), (0, 1, 0)), mode=Mode.SUBTRACT)


solid = part_1.part
